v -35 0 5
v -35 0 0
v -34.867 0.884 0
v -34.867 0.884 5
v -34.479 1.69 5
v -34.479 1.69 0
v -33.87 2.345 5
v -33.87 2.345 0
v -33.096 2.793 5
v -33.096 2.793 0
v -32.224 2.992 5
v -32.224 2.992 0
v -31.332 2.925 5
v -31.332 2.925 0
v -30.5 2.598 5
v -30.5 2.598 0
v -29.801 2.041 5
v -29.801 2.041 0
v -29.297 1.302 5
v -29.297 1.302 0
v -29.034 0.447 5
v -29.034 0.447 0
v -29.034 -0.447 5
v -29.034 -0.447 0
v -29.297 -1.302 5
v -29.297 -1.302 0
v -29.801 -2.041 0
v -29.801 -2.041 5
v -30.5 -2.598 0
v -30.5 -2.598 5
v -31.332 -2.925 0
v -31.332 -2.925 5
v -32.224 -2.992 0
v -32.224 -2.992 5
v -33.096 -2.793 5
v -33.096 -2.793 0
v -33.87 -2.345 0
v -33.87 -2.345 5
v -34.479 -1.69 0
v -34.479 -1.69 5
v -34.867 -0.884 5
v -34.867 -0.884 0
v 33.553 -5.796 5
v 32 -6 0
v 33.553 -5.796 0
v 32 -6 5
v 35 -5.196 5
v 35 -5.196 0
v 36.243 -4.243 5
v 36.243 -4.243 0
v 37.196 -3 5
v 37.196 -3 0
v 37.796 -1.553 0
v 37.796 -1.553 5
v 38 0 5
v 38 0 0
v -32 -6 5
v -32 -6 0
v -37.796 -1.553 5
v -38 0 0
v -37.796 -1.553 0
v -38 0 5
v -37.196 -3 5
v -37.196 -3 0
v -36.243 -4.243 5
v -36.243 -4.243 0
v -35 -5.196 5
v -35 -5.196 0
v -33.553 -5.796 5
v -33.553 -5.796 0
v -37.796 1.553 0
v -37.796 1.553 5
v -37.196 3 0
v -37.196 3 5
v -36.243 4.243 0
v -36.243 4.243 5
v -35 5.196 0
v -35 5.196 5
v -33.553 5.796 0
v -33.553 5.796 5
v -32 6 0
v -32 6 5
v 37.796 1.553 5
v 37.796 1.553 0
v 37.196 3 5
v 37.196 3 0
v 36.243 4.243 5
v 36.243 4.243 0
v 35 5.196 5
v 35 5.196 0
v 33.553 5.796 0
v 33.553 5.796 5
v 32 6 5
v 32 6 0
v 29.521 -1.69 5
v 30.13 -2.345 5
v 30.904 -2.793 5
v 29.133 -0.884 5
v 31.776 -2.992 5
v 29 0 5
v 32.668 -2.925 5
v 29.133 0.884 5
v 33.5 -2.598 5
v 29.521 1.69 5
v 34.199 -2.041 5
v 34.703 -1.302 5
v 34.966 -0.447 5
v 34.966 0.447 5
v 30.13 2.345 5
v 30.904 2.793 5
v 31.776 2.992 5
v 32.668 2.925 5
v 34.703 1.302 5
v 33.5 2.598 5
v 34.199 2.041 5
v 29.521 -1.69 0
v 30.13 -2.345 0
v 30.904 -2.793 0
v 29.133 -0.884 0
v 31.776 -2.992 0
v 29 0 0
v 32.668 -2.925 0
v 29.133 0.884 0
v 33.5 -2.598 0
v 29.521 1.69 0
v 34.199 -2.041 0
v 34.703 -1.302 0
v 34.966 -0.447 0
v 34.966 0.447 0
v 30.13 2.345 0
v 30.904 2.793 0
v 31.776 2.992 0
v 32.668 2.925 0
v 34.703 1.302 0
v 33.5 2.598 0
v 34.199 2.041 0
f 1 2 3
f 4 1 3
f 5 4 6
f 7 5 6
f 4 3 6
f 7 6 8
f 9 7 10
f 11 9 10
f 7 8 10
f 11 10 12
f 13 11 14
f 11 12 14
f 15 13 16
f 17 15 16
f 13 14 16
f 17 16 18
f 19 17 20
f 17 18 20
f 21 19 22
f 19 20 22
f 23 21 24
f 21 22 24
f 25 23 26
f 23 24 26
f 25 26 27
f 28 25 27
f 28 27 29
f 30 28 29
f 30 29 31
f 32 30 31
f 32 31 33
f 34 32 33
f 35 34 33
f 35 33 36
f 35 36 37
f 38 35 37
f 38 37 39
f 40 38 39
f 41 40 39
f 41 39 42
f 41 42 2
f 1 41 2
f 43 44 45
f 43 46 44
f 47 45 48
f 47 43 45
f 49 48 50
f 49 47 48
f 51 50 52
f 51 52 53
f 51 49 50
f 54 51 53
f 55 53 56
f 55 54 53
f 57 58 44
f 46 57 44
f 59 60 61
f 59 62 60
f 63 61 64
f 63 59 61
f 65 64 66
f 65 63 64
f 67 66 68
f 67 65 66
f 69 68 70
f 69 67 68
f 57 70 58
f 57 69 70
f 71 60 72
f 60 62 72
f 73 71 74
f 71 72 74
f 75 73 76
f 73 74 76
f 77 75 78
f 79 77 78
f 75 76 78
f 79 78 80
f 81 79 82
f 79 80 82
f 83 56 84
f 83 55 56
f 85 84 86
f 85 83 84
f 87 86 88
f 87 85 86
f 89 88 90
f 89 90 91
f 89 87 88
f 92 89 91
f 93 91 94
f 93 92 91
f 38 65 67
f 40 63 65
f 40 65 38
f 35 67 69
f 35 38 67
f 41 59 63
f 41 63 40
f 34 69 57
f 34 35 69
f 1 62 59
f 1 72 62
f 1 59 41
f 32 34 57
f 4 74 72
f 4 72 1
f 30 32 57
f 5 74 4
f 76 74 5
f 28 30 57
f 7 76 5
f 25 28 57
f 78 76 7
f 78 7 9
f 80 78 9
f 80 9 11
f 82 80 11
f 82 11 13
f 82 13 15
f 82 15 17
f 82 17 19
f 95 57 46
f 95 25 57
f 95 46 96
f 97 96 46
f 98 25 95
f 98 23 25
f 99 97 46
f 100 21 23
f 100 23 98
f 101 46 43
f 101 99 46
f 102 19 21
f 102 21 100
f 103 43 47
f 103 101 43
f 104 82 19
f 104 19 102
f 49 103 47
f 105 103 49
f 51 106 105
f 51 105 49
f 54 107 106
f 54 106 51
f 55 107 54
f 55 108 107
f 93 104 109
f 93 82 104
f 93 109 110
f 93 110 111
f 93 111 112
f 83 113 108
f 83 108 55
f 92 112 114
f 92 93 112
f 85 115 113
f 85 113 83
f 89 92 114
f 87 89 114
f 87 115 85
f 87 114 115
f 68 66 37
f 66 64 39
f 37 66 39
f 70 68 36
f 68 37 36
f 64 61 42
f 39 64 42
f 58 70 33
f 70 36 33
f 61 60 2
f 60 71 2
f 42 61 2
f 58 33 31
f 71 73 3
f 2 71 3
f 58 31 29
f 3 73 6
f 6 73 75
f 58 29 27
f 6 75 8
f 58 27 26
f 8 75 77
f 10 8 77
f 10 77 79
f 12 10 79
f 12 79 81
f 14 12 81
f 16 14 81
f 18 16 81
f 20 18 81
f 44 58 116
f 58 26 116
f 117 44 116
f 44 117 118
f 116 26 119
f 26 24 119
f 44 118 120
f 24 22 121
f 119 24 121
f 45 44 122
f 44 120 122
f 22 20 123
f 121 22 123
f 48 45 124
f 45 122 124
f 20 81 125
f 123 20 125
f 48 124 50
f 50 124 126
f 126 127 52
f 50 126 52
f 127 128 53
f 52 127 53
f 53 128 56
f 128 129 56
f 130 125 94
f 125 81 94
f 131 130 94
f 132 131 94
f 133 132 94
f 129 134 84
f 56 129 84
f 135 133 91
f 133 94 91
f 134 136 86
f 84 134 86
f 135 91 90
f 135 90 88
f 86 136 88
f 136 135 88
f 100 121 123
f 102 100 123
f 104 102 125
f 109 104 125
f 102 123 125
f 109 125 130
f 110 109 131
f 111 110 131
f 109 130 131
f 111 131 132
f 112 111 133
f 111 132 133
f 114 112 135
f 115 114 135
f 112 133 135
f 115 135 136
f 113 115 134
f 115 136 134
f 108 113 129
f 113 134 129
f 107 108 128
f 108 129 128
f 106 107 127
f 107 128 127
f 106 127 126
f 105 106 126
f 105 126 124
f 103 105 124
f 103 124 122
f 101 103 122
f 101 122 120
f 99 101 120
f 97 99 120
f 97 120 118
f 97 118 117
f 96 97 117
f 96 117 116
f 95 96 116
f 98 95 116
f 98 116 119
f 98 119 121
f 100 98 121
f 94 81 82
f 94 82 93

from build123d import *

# Parameters (mm, degrees)
SKIZZE1_W                       = 76
SKIZZE1_H                       = 12
AUFSATZ_LINEAR_AUSTRAGEN1_DEPTH = 5
VERRUNDUNG1_R                   = 6
F_6_0_6_DURCHMESSER_BOHRUNG3_D  = 6


with BuildPart() as part:
    # Skizze1 → Aufsatz-Linear austragen1 (new body)
    with BuildSketch(Plane.XY):
        Rectangle(SKIZZE1_W, SKIZZE1_H)
    extrude(amount=AUFSATZ_LINEAR_AUSTRAGEN1_DEPTH)

    # Verrundung1
    verrundung1_edges = [part.edges().sort_by_distance(p)[0] for p in [
        (-38, -6, 2.5),
        (38, -6, 2.5),
        (38, 6, 2.5),
        (-38, 6, 2.5),
    ]]
    fillet(verrundung1_edges, radius=VERRUNDUNG1_R - 0.0001)  # a hair under: the kernel refuses the full size

    # Ø6.0 (6) Durchmesser Bohrung3 (through all)
    with Locations(Plane.XY.offset(5)):
        with Locations((-32, 0), (32, 0)):
            Hole(F_6_0_6_DURCHMESSER_BOHRUNG3_D / 2)


solid = part.part
